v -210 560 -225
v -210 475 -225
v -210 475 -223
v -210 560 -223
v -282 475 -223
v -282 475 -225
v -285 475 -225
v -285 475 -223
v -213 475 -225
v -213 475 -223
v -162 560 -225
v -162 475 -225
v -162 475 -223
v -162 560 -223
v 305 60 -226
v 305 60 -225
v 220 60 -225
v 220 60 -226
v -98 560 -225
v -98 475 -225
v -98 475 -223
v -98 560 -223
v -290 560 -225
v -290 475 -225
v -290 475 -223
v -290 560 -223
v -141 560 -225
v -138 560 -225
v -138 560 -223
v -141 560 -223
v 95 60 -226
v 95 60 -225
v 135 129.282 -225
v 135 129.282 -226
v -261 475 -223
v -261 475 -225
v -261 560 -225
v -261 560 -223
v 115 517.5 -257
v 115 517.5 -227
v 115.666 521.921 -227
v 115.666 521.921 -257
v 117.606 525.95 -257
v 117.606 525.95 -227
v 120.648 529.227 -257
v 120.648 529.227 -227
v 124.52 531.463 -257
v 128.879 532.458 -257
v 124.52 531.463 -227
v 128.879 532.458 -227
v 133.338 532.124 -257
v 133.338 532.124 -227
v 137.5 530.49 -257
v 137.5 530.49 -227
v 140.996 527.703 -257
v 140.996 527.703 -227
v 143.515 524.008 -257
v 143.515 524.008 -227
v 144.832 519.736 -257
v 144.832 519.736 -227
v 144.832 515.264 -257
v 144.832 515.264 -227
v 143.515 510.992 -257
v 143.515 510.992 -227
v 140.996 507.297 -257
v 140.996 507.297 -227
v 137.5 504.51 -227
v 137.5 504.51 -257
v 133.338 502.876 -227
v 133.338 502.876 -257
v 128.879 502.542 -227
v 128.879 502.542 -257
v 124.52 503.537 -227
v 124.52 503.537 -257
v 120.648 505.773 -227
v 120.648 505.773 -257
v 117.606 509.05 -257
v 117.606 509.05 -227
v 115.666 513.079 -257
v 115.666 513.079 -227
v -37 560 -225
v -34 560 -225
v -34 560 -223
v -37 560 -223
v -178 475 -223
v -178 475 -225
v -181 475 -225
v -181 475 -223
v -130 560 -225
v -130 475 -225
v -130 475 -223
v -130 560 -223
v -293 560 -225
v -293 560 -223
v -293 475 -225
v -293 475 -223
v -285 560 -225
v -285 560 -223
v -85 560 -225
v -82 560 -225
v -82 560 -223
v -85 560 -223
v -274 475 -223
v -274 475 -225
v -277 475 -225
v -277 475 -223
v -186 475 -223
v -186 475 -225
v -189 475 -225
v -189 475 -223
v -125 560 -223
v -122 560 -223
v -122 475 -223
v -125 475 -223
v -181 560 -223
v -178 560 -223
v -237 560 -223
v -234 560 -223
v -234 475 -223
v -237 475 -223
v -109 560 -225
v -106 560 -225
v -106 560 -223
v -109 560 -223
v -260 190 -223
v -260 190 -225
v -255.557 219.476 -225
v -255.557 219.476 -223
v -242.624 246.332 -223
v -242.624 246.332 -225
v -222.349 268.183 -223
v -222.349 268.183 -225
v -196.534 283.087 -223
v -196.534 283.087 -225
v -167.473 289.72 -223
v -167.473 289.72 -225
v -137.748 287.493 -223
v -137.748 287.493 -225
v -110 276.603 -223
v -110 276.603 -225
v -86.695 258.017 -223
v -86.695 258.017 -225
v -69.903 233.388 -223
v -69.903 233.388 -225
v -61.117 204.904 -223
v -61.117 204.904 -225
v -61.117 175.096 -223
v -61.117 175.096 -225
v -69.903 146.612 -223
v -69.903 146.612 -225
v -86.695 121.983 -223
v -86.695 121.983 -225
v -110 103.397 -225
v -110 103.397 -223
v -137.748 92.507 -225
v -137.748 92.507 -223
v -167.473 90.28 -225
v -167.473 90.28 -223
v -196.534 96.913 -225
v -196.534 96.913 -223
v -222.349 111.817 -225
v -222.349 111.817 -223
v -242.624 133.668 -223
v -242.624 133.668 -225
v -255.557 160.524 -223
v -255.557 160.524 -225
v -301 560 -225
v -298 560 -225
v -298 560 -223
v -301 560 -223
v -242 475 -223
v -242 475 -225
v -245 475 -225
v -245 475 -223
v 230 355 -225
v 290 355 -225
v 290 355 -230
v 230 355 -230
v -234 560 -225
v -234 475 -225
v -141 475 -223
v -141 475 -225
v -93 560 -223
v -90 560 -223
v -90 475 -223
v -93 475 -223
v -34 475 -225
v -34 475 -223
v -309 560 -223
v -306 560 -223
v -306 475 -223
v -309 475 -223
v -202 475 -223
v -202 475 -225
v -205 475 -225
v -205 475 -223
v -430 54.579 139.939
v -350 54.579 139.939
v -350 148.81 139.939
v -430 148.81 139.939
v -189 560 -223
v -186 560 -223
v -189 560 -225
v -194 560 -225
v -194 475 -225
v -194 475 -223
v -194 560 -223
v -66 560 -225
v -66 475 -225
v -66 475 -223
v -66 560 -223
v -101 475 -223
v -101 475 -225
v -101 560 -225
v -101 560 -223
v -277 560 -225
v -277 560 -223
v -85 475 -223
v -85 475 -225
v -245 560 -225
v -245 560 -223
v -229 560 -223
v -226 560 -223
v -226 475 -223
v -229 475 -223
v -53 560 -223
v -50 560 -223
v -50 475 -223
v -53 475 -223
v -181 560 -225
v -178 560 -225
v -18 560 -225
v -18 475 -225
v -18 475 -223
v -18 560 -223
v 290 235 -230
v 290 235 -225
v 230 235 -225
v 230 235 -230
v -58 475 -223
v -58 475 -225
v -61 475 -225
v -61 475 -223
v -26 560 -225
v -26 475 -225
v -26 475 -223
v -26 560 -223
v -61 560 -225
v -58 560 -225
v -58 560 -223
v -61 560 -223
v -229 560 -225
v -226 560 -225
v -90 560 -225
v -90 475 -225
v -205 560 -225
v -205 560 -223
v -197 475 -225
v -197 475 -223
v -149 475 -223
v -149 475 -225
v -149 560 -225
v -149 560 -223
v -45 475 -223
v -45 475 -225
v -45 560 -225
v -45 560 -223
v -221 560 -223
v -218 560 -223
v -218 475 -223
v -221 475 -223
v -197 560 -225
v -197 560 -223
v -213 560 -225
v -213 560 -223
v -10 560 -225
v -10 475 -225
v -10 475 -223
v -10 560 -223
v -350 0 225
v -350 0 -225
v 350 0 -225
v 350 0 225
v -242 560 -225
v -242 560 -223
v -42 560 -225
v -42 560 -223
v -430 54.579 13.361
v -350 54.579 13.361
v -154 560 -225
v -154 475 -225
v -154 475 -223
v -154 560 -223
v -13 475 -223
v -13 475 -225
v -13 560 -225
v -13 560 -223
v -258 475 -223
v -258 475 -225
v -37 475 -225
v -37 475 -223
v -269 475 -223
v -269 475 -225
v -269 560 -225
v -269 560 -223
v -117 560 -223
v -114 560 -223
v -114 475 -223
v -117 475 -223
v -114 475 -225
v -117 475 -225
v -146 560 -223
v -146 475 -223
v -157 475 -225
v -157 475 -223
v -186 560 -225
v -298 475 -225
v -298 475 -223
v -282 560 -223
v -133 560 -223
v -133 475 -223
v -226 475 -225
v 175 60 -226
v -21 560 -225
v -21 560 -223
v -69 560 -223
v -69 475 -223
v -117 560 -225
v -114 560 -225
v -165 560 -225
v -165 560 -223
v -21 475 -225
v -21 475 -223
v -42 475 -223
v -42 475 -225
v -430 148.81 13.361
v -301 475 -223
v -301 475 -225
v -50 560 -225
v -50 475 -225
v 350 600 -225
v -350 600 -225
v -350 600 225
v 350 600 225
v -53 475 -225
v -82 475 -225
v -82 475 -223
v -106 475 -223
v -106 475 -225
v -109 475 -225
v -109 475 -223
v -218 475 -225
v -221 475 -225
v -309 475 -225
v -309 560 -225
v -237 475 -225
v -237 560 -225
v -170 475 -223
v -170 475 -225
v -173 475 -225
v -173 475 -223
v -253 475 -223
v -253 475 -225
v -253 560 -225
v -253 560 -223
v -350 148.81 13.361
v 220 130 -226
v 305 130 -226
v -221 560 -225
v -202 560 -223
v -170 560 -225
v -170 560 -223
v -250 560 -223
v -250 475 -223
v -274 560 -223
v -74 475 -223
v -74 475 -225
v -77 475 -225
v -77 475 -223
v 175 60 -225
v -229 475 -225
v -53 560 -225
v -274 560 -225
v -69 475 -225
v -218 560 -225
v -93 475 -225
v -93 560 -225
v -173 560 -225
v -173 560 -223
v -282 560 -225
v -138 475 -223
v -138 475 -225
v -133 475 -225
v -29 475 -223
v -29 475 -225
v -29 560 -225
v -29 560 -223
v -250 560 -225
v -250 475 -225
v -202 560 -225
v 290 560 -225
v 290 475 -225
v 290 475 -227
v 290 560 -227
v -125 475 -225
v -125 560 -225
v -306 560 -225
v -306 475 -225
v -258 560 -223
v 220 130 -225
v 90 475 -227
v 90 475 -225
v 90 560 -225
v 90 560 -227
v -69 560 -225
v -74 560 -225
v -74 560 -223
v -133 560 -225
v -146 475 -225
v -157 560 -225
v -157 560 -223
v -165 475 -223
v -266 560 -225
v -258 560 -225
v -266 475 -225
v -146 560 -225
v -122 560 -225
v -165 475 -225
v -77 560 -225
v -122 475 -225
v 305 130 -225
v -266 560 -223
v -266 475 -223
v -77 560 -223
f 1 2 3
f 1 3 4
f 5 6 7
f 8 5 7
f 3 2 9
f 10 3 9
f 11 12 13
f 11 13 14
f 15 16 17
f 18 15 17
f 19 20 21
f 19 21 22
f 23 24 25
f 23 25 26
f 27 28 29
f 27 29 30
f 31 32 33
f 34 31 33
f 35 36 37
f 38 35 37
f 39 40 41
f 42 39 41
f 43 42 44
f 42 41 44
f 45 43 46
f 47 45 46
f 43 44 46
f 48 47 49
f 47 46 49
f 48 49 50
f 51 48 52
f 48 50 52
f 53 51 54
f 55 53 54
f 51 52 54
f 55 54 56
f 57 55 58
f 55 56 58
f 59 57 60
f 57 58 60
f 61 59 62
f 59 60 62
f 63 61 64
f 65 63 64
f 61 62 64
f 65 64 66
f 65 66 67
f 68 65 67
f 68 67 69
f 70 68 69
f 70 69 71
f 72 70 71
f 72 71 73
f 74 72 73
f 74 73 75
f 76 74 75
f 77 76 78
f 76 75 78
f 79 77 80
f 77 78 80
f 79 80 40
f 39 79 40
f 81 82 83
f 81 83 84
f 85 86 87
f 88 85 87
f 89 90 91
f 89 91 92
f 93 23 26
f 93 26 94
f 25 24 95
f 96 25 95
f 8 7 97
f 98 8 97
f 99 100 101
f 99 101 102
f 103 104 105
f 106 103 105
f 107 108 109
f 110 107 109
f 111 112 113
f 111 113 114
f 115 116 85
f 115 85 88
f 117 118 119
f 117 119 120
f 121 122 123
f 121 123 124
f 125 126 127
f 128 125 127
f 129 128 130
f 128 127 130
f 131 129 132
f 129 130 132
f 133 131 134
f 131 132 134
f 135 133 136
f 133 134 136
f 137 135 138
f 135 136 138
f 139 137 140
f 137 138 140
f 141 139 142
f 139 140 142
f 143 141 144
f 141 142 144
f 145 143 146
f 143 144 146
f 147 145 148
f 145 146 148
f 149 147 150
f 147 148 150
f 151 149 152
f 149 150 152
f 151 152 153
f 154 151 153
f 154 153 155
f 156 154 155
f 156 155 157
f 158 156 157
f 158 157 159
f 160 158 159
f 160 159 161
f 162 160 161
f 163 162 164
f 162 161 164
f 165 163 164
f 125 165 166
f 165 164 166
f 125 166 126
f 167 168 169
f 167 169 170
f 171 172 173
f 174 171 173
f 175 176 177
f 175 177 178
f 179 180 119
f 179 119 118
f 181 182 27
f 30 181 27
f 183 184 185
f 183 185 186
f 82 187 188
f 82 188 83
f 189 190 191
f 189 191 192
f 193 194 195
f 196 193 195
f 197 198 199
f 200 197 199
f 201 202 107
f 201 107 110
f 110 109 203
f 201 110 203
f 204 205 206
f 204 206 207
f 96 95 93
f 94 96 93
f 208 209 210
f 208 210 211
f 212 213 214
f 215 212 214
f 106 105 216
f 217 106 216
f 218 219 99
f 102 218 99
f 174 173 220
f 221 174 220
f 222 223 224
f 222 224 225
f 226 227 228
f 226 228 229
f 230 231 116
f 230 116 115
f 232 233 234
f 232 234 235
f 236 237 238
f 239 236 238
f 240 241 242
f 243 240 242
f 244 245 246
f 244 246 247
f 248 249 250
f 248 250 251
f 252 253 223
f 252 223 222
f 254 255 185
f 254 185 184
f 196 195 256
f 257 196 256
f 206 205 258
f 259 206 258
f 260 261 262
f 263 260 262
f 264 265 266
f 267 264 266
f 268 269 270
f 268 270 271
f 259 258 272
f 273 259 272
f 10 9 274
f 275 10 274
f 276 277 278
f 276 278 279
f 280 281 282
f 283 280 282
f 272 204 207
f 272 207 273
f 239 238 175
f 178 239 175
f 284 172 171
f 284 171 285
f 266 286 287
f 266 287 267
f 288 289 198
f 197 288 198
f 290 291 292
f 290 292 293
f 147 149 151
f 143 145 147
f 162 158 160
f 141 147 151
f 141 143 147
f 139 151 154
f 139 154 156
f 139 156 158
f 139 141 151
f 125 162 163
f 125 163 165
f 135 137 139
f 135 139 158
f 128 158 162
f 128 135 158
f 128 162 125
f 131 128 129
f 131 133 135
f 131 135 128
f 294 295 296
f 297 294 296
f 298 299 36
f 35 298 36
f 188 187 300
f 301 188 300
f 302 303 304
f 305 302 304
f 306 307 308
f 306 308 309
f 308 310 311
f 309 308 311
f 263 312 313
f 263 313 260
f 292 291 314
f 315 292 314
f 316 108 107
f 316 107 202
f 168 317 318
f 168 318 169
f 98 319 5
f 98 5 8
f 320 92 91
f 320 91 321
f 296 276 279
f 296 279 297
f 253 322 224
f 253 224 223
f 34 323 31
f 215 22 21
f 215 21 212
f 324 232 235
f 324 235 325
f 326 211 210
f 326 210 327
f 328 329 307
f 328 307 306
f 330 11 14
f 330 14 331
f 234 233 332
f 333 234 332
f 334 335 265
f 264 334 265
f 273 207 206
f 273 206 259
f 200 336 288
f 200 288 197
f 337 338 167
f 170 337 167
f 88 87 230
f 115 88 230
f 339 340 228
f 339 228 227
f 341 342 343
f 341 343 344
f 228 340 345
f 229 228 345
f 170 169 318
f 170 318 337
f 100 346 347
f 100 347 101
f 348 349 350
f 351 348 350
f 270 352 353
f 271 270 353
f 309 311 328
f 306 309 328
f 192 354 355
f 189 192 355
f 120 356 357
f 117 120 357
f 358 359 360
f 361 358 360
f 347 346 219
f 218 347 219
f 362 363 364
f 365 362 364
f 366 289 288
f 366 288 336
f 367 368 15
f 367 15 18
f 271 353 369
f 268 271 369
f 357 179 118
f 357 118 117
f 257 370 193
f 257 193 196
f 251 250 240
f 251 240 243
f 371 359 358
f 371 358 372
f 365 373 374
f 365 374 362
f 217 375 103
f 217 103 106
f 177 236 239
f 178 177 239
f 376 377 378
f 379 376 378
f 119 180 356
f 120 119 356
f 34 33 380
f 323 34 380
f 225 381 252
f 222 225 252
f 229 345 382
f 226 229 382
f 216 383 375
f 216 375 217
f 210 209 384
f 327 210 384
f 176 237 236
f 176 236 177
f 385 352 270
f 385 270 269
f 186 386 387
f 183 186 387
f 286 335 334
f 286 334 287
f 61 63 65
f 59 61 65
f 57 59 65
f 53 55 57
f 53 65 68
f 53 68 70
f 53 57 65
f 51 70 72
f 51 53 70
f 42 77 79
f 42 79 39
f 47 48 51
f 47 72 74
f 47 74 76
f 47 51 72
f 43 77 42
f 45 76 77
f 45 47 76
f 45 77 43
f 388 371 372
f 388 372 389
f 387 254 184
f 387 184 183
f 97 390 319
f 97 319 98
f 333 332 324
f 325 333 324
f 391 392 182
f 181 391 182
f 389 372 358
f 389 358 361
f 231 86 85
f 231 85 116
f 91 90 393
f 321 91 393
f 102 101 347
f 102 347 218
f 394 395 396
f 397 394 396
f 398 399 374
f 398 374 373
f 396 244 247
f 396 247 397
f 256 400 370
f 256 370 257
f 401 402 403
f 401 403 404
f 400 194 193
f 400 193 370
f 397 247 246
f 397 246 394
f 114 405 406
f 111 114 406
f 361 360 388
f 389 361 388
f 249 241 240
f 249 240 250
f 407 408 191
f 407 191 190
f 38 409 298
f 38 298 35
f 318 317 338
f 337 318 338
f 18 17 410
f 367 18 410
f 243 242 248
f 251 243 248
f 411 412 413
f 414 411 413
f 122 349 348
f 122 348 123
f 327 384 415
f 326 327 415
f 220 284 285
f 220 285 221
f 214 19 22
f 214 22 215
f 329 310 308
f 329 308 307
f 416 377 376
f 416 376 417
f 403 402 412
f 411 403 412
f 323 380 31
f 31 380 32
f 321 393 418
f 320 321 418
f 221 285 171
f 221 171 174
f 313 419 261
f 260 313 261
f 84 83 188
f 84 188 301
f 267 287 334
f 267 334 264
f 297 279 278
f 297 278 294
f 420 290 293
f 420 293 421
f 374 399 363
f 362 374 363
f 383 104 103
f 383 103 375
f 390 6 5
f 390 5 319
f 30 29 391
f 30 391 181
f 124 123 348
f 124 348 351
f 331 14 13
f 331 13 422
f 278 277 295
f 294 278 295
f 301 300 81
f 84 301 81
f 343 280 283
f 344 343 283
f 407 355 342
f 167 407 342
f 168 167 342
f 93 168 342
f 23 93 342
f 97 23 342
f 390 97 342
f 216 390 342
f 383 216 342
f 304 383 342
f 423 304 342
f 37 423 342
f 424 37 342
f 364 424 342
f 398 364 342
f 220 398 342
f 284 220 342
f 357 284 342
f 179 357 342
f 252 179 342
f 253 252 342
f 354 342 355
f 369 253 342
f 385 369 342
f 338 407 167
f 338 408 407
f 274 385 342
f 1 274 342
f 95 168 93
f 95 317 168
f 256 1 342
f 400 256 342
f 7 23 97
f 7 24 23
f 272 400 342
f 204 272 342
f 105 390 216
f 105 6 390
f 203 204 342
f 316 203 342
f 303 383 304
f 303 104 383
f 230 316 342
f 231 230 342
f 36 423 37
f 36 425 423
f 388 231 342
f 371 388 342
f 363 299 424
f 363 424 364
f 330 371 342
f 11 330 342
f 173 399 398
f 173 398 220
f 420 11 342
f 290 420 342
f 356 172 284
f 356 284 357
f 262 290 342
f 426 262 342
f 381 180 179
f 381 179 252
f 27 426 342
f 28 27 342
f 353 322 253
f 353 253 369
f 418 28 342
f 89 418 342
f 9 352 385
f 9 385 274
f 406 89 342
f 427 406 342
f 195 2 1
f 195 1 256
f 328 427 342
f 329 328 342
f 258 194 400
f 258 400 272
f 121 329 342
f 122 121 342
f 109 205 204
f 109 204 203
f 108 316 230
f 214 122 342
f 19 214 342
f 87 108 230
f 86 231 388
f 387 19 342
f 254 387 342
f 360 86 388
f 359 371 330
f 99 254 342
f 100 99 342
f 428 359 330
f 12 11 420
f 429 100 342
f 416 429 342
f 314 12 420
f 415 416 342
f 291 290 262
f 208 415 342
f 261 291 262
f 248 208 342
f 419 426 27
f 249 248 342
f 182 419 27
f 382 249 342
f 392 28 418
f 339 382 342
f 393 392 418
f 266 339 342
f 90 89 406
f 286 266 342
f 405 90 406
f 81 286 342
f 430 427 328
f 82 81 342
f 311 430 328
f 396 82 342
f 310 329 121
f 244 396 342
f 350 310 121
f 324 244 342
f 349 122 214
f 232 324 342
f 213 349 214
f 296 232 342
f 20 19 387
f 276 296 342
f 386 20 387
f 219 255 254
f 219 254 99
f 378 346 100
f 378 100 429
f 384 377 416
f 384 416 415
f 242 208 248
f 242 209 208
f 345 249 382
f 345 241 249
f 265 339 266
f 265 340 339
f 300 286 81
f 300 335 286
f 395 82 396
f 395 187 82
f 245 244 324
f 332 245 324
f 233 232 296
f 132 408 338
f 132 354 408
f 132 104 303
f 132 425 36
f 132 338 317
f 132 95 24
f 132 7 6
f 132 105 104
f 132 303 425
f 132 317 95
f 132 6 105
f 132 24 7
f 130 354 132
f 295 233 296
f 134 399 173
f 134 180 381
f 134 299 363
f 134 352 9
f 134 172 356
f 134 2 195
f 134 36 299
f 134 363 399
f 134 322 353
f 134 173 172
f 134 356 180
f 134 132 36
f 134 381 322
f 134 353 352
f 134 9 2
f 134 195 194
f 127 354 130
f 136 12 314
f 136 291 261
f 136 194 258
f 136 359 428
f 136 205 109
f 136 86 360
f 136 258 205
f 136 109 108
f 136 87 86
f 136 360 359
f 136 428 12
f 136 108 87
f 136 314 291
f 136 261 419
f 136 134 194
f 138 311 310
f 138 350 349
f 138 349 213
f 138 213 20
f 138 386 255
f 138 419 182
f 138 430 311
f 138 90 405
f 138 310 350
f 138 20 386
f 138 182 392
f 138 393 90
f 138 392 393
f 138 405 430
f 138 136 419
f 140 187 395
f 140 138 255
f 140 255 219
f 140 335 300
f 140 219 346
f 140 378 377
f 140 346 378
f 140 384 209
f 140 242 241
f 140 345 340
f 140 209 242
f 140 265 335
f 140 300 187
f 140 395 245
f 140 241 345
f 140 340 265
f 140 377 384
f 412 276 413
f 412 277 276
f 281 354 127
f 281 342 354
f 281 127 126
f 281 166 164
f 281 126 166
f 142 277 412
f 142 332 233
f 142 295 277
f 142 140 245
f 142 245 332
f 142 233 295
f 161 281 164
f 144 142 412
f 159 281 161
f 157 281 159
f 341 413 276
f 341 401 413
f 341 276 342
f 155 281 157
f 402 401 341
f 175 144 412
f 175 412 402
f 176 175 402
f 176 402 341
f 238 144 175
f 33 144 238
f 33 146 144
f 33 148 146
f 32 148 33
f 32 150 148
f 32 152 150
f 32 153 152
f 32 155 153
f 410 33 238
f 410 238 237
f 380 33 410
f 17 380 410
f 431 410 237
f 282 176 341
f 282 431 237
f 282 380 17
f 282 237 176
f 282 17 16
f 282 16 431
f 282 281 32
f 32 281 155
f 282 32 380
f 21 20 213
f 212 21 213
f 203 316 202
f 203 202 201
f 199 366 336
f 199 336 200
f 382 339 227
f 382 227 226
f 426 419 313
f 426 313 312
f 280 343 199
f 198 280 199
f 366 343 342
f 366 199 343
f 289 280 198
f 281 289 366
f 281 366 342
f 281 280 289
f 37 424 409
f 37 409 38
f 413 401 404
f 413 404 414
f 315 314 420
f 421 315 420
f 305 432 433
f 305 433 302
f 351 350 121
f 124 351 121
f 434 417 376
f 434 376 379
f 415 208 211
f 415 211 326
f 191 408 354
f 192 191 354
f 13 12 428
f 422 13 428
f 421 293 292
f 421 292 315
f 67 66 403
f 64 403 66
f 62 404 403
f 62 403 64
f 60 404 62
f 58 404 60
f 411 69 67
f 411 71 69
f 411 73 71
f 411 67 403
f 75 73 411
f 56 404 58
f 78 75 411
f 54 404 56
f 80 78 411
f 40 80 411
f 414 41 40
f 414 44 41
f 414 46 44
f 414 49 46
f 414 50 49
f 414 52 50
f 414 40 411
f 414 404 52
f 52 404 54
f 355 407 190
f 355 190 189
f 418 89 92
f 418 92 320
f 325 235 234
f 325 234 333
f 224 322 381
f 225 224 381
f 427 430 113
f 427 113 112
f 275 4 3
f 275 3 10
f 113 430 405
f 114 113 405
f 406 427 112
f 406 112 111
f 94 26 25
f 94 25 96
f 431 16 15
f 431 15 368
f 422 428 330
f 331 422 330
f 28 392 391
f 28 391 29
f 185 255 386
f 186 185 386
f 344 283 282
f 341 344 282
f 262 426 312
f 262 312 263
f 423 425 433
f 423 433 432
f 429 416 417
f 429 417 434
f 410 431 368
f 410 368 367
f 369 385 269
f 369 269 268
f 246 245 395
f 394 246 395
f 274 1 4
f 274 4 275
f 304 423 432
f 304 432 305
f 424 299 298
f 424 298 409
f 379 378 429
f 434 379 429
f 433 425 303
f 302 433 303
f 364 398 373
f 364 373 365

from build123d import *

# Parameters (mm, degrees)
SKETCH_1_W             = 700
SKETCH_1_H             = 450
EXTRUDE_1_DEPTH        = 600
SKETCH_2_W             = 126.57796077
SKETCH_2_H             = 94.230259684
EXTRUDE_2_DEPTH        = 80
SKETCH_3_R             = 100
CUT_EXTRUDE_1_DEPTH    = 2
SKETCH_4_W             = 200
SKETCH_4_H             = 85
EXTRUDE_3_DEPTH        = 2
SKETCH_5_R             = 15
EXTRUDE_4_DEPTH        = 30
SKETCH_6_W             = 60
SKETCH_6_H             = 120
EXTRUDE_5_DEPTH        = 5
SKETCH_7_W             = 85
SKETCH_7_H             = 70
EXTRUDE_6_DEPTH        = 1
SKETCH_8_W             = 3
SKETCH_8_H             = 85
CUT_EXTRUDE_2_DEPTH    = 2
PATTERN_LINEAR_1_COUNT = 38
PATTERN_LINEAR_1_PITCH = 8


with BuildPart() as part:
    # 草图1 → 凸台-拉伸1 (new body)
    with BuildSketch(Plane(origin=(0, 0, 0), x_dir=(1, 0, 0), z_dir=(0, 1, 0))):
        Rectangle(SKETCH_1_W, SKETCH_1_H)
    extrude(amount=EXTRUDE_1_DEPTH)

    # 草图2 → 凸台-拉伸2 (add)
    with BuildSketch(Plane.ZY.offset(350)):
        with Locations((76.649987355, 101.694528127)):
            Rectangle(SKETCH_2_W, SKETCH_2_H)
    extrude(amount=EXTRUDE_2_DEPTH)

    # 草图3 → 切除-拉伸1 (cut)
    with BuildSketch(Plane(origin=(0, 0, -225), x_dir=(-1, 0, 0), z_dir=(0, 0, -1))):
        with Locations((160, 190)):
            Circle(SKETCH_3_R)
    extrude(amount=-CUT_EXTRUDE_1_DEPTH, mode=Mode.SUBTRACT)

    # 草图4 → 凸台-拉伸3 (add)
    with BuildSketch(Plane(origin=(0, 0, -225), x_dir=(-1, 0, 0), z_dir=(0, 0, -1))):
        with Locations((-190, 517.5)):
            Rectangle(SKETCH_4_W, SKETCH_4_H)
    extrude(amount=EXTRUDE_3_DEPTH)

    # 草图5 → 凸台-拉伸4 (add)
    with BuildSketch(Plane(origin=(0, 0, -227), x_dir=(-1, 0, 0), z_dir=(0, 0, -1))):
        with Locations((-130, 517.5)):
            Circle(SKETCH_5_R)
    extrude(amount=EXTRUDE_4_DEPTH)

    # 草图6 → 凸台-拉伸5 (add)
    with BuildSketch(Plane(origin=(0, 0, -225), x_dir=(-1, 0, 0), z_dir=(0, 0, -1))):
        with Locations((-260, 295)):
            Rectangle(SKETCH_6_W, SKETCH_6_H)
    extrude(amount=EXTRUDE_5_DEPTH)

    # 草图7 → 凸台-拉伸6 (add)
    with BuildSketch(Plane(origin=(0, 0, -225), x_dir=(-1, 0, 0), z_dir=(0, 0, -1))):
        Polygon((-135, 129.282032303), (-175, 60), (-95, 60), align=None)
        with Locations((-262.5, 95)):
            Rectangle(SKETCH_7_W, SKETCH_7_H)
    extrude(amount=EXTRUDE_6_DEPTH)

    # 草图8 → 切除-拉伸2 (cut)
    with BuildSketch(Plane(origin=(0, 0, -225), x_dir=(-1, 0, 0), z_dir=(0, 0, -1))):
        with Locations((11.5, 517.5)):
            Rectangle(SKETCH_8_W, SKETCH_8_H)
    cut_extrude_2 = extrude(amount=-CUT_EXTRUDE_2_DEPTH, mode=Mode.SUBTRACT)

    # 阵列(线性)1: 切除-拉伸2 ×38
    with Locations(*[(-i * PATTERN_LINEAR_1_PITCH, 0, 0) for i in range(1, PATTERN_LINEAR_1_COUNT)]):
        add(cut_extrude_2, mode=Mode.SUBTRACT)


solid = part.part
